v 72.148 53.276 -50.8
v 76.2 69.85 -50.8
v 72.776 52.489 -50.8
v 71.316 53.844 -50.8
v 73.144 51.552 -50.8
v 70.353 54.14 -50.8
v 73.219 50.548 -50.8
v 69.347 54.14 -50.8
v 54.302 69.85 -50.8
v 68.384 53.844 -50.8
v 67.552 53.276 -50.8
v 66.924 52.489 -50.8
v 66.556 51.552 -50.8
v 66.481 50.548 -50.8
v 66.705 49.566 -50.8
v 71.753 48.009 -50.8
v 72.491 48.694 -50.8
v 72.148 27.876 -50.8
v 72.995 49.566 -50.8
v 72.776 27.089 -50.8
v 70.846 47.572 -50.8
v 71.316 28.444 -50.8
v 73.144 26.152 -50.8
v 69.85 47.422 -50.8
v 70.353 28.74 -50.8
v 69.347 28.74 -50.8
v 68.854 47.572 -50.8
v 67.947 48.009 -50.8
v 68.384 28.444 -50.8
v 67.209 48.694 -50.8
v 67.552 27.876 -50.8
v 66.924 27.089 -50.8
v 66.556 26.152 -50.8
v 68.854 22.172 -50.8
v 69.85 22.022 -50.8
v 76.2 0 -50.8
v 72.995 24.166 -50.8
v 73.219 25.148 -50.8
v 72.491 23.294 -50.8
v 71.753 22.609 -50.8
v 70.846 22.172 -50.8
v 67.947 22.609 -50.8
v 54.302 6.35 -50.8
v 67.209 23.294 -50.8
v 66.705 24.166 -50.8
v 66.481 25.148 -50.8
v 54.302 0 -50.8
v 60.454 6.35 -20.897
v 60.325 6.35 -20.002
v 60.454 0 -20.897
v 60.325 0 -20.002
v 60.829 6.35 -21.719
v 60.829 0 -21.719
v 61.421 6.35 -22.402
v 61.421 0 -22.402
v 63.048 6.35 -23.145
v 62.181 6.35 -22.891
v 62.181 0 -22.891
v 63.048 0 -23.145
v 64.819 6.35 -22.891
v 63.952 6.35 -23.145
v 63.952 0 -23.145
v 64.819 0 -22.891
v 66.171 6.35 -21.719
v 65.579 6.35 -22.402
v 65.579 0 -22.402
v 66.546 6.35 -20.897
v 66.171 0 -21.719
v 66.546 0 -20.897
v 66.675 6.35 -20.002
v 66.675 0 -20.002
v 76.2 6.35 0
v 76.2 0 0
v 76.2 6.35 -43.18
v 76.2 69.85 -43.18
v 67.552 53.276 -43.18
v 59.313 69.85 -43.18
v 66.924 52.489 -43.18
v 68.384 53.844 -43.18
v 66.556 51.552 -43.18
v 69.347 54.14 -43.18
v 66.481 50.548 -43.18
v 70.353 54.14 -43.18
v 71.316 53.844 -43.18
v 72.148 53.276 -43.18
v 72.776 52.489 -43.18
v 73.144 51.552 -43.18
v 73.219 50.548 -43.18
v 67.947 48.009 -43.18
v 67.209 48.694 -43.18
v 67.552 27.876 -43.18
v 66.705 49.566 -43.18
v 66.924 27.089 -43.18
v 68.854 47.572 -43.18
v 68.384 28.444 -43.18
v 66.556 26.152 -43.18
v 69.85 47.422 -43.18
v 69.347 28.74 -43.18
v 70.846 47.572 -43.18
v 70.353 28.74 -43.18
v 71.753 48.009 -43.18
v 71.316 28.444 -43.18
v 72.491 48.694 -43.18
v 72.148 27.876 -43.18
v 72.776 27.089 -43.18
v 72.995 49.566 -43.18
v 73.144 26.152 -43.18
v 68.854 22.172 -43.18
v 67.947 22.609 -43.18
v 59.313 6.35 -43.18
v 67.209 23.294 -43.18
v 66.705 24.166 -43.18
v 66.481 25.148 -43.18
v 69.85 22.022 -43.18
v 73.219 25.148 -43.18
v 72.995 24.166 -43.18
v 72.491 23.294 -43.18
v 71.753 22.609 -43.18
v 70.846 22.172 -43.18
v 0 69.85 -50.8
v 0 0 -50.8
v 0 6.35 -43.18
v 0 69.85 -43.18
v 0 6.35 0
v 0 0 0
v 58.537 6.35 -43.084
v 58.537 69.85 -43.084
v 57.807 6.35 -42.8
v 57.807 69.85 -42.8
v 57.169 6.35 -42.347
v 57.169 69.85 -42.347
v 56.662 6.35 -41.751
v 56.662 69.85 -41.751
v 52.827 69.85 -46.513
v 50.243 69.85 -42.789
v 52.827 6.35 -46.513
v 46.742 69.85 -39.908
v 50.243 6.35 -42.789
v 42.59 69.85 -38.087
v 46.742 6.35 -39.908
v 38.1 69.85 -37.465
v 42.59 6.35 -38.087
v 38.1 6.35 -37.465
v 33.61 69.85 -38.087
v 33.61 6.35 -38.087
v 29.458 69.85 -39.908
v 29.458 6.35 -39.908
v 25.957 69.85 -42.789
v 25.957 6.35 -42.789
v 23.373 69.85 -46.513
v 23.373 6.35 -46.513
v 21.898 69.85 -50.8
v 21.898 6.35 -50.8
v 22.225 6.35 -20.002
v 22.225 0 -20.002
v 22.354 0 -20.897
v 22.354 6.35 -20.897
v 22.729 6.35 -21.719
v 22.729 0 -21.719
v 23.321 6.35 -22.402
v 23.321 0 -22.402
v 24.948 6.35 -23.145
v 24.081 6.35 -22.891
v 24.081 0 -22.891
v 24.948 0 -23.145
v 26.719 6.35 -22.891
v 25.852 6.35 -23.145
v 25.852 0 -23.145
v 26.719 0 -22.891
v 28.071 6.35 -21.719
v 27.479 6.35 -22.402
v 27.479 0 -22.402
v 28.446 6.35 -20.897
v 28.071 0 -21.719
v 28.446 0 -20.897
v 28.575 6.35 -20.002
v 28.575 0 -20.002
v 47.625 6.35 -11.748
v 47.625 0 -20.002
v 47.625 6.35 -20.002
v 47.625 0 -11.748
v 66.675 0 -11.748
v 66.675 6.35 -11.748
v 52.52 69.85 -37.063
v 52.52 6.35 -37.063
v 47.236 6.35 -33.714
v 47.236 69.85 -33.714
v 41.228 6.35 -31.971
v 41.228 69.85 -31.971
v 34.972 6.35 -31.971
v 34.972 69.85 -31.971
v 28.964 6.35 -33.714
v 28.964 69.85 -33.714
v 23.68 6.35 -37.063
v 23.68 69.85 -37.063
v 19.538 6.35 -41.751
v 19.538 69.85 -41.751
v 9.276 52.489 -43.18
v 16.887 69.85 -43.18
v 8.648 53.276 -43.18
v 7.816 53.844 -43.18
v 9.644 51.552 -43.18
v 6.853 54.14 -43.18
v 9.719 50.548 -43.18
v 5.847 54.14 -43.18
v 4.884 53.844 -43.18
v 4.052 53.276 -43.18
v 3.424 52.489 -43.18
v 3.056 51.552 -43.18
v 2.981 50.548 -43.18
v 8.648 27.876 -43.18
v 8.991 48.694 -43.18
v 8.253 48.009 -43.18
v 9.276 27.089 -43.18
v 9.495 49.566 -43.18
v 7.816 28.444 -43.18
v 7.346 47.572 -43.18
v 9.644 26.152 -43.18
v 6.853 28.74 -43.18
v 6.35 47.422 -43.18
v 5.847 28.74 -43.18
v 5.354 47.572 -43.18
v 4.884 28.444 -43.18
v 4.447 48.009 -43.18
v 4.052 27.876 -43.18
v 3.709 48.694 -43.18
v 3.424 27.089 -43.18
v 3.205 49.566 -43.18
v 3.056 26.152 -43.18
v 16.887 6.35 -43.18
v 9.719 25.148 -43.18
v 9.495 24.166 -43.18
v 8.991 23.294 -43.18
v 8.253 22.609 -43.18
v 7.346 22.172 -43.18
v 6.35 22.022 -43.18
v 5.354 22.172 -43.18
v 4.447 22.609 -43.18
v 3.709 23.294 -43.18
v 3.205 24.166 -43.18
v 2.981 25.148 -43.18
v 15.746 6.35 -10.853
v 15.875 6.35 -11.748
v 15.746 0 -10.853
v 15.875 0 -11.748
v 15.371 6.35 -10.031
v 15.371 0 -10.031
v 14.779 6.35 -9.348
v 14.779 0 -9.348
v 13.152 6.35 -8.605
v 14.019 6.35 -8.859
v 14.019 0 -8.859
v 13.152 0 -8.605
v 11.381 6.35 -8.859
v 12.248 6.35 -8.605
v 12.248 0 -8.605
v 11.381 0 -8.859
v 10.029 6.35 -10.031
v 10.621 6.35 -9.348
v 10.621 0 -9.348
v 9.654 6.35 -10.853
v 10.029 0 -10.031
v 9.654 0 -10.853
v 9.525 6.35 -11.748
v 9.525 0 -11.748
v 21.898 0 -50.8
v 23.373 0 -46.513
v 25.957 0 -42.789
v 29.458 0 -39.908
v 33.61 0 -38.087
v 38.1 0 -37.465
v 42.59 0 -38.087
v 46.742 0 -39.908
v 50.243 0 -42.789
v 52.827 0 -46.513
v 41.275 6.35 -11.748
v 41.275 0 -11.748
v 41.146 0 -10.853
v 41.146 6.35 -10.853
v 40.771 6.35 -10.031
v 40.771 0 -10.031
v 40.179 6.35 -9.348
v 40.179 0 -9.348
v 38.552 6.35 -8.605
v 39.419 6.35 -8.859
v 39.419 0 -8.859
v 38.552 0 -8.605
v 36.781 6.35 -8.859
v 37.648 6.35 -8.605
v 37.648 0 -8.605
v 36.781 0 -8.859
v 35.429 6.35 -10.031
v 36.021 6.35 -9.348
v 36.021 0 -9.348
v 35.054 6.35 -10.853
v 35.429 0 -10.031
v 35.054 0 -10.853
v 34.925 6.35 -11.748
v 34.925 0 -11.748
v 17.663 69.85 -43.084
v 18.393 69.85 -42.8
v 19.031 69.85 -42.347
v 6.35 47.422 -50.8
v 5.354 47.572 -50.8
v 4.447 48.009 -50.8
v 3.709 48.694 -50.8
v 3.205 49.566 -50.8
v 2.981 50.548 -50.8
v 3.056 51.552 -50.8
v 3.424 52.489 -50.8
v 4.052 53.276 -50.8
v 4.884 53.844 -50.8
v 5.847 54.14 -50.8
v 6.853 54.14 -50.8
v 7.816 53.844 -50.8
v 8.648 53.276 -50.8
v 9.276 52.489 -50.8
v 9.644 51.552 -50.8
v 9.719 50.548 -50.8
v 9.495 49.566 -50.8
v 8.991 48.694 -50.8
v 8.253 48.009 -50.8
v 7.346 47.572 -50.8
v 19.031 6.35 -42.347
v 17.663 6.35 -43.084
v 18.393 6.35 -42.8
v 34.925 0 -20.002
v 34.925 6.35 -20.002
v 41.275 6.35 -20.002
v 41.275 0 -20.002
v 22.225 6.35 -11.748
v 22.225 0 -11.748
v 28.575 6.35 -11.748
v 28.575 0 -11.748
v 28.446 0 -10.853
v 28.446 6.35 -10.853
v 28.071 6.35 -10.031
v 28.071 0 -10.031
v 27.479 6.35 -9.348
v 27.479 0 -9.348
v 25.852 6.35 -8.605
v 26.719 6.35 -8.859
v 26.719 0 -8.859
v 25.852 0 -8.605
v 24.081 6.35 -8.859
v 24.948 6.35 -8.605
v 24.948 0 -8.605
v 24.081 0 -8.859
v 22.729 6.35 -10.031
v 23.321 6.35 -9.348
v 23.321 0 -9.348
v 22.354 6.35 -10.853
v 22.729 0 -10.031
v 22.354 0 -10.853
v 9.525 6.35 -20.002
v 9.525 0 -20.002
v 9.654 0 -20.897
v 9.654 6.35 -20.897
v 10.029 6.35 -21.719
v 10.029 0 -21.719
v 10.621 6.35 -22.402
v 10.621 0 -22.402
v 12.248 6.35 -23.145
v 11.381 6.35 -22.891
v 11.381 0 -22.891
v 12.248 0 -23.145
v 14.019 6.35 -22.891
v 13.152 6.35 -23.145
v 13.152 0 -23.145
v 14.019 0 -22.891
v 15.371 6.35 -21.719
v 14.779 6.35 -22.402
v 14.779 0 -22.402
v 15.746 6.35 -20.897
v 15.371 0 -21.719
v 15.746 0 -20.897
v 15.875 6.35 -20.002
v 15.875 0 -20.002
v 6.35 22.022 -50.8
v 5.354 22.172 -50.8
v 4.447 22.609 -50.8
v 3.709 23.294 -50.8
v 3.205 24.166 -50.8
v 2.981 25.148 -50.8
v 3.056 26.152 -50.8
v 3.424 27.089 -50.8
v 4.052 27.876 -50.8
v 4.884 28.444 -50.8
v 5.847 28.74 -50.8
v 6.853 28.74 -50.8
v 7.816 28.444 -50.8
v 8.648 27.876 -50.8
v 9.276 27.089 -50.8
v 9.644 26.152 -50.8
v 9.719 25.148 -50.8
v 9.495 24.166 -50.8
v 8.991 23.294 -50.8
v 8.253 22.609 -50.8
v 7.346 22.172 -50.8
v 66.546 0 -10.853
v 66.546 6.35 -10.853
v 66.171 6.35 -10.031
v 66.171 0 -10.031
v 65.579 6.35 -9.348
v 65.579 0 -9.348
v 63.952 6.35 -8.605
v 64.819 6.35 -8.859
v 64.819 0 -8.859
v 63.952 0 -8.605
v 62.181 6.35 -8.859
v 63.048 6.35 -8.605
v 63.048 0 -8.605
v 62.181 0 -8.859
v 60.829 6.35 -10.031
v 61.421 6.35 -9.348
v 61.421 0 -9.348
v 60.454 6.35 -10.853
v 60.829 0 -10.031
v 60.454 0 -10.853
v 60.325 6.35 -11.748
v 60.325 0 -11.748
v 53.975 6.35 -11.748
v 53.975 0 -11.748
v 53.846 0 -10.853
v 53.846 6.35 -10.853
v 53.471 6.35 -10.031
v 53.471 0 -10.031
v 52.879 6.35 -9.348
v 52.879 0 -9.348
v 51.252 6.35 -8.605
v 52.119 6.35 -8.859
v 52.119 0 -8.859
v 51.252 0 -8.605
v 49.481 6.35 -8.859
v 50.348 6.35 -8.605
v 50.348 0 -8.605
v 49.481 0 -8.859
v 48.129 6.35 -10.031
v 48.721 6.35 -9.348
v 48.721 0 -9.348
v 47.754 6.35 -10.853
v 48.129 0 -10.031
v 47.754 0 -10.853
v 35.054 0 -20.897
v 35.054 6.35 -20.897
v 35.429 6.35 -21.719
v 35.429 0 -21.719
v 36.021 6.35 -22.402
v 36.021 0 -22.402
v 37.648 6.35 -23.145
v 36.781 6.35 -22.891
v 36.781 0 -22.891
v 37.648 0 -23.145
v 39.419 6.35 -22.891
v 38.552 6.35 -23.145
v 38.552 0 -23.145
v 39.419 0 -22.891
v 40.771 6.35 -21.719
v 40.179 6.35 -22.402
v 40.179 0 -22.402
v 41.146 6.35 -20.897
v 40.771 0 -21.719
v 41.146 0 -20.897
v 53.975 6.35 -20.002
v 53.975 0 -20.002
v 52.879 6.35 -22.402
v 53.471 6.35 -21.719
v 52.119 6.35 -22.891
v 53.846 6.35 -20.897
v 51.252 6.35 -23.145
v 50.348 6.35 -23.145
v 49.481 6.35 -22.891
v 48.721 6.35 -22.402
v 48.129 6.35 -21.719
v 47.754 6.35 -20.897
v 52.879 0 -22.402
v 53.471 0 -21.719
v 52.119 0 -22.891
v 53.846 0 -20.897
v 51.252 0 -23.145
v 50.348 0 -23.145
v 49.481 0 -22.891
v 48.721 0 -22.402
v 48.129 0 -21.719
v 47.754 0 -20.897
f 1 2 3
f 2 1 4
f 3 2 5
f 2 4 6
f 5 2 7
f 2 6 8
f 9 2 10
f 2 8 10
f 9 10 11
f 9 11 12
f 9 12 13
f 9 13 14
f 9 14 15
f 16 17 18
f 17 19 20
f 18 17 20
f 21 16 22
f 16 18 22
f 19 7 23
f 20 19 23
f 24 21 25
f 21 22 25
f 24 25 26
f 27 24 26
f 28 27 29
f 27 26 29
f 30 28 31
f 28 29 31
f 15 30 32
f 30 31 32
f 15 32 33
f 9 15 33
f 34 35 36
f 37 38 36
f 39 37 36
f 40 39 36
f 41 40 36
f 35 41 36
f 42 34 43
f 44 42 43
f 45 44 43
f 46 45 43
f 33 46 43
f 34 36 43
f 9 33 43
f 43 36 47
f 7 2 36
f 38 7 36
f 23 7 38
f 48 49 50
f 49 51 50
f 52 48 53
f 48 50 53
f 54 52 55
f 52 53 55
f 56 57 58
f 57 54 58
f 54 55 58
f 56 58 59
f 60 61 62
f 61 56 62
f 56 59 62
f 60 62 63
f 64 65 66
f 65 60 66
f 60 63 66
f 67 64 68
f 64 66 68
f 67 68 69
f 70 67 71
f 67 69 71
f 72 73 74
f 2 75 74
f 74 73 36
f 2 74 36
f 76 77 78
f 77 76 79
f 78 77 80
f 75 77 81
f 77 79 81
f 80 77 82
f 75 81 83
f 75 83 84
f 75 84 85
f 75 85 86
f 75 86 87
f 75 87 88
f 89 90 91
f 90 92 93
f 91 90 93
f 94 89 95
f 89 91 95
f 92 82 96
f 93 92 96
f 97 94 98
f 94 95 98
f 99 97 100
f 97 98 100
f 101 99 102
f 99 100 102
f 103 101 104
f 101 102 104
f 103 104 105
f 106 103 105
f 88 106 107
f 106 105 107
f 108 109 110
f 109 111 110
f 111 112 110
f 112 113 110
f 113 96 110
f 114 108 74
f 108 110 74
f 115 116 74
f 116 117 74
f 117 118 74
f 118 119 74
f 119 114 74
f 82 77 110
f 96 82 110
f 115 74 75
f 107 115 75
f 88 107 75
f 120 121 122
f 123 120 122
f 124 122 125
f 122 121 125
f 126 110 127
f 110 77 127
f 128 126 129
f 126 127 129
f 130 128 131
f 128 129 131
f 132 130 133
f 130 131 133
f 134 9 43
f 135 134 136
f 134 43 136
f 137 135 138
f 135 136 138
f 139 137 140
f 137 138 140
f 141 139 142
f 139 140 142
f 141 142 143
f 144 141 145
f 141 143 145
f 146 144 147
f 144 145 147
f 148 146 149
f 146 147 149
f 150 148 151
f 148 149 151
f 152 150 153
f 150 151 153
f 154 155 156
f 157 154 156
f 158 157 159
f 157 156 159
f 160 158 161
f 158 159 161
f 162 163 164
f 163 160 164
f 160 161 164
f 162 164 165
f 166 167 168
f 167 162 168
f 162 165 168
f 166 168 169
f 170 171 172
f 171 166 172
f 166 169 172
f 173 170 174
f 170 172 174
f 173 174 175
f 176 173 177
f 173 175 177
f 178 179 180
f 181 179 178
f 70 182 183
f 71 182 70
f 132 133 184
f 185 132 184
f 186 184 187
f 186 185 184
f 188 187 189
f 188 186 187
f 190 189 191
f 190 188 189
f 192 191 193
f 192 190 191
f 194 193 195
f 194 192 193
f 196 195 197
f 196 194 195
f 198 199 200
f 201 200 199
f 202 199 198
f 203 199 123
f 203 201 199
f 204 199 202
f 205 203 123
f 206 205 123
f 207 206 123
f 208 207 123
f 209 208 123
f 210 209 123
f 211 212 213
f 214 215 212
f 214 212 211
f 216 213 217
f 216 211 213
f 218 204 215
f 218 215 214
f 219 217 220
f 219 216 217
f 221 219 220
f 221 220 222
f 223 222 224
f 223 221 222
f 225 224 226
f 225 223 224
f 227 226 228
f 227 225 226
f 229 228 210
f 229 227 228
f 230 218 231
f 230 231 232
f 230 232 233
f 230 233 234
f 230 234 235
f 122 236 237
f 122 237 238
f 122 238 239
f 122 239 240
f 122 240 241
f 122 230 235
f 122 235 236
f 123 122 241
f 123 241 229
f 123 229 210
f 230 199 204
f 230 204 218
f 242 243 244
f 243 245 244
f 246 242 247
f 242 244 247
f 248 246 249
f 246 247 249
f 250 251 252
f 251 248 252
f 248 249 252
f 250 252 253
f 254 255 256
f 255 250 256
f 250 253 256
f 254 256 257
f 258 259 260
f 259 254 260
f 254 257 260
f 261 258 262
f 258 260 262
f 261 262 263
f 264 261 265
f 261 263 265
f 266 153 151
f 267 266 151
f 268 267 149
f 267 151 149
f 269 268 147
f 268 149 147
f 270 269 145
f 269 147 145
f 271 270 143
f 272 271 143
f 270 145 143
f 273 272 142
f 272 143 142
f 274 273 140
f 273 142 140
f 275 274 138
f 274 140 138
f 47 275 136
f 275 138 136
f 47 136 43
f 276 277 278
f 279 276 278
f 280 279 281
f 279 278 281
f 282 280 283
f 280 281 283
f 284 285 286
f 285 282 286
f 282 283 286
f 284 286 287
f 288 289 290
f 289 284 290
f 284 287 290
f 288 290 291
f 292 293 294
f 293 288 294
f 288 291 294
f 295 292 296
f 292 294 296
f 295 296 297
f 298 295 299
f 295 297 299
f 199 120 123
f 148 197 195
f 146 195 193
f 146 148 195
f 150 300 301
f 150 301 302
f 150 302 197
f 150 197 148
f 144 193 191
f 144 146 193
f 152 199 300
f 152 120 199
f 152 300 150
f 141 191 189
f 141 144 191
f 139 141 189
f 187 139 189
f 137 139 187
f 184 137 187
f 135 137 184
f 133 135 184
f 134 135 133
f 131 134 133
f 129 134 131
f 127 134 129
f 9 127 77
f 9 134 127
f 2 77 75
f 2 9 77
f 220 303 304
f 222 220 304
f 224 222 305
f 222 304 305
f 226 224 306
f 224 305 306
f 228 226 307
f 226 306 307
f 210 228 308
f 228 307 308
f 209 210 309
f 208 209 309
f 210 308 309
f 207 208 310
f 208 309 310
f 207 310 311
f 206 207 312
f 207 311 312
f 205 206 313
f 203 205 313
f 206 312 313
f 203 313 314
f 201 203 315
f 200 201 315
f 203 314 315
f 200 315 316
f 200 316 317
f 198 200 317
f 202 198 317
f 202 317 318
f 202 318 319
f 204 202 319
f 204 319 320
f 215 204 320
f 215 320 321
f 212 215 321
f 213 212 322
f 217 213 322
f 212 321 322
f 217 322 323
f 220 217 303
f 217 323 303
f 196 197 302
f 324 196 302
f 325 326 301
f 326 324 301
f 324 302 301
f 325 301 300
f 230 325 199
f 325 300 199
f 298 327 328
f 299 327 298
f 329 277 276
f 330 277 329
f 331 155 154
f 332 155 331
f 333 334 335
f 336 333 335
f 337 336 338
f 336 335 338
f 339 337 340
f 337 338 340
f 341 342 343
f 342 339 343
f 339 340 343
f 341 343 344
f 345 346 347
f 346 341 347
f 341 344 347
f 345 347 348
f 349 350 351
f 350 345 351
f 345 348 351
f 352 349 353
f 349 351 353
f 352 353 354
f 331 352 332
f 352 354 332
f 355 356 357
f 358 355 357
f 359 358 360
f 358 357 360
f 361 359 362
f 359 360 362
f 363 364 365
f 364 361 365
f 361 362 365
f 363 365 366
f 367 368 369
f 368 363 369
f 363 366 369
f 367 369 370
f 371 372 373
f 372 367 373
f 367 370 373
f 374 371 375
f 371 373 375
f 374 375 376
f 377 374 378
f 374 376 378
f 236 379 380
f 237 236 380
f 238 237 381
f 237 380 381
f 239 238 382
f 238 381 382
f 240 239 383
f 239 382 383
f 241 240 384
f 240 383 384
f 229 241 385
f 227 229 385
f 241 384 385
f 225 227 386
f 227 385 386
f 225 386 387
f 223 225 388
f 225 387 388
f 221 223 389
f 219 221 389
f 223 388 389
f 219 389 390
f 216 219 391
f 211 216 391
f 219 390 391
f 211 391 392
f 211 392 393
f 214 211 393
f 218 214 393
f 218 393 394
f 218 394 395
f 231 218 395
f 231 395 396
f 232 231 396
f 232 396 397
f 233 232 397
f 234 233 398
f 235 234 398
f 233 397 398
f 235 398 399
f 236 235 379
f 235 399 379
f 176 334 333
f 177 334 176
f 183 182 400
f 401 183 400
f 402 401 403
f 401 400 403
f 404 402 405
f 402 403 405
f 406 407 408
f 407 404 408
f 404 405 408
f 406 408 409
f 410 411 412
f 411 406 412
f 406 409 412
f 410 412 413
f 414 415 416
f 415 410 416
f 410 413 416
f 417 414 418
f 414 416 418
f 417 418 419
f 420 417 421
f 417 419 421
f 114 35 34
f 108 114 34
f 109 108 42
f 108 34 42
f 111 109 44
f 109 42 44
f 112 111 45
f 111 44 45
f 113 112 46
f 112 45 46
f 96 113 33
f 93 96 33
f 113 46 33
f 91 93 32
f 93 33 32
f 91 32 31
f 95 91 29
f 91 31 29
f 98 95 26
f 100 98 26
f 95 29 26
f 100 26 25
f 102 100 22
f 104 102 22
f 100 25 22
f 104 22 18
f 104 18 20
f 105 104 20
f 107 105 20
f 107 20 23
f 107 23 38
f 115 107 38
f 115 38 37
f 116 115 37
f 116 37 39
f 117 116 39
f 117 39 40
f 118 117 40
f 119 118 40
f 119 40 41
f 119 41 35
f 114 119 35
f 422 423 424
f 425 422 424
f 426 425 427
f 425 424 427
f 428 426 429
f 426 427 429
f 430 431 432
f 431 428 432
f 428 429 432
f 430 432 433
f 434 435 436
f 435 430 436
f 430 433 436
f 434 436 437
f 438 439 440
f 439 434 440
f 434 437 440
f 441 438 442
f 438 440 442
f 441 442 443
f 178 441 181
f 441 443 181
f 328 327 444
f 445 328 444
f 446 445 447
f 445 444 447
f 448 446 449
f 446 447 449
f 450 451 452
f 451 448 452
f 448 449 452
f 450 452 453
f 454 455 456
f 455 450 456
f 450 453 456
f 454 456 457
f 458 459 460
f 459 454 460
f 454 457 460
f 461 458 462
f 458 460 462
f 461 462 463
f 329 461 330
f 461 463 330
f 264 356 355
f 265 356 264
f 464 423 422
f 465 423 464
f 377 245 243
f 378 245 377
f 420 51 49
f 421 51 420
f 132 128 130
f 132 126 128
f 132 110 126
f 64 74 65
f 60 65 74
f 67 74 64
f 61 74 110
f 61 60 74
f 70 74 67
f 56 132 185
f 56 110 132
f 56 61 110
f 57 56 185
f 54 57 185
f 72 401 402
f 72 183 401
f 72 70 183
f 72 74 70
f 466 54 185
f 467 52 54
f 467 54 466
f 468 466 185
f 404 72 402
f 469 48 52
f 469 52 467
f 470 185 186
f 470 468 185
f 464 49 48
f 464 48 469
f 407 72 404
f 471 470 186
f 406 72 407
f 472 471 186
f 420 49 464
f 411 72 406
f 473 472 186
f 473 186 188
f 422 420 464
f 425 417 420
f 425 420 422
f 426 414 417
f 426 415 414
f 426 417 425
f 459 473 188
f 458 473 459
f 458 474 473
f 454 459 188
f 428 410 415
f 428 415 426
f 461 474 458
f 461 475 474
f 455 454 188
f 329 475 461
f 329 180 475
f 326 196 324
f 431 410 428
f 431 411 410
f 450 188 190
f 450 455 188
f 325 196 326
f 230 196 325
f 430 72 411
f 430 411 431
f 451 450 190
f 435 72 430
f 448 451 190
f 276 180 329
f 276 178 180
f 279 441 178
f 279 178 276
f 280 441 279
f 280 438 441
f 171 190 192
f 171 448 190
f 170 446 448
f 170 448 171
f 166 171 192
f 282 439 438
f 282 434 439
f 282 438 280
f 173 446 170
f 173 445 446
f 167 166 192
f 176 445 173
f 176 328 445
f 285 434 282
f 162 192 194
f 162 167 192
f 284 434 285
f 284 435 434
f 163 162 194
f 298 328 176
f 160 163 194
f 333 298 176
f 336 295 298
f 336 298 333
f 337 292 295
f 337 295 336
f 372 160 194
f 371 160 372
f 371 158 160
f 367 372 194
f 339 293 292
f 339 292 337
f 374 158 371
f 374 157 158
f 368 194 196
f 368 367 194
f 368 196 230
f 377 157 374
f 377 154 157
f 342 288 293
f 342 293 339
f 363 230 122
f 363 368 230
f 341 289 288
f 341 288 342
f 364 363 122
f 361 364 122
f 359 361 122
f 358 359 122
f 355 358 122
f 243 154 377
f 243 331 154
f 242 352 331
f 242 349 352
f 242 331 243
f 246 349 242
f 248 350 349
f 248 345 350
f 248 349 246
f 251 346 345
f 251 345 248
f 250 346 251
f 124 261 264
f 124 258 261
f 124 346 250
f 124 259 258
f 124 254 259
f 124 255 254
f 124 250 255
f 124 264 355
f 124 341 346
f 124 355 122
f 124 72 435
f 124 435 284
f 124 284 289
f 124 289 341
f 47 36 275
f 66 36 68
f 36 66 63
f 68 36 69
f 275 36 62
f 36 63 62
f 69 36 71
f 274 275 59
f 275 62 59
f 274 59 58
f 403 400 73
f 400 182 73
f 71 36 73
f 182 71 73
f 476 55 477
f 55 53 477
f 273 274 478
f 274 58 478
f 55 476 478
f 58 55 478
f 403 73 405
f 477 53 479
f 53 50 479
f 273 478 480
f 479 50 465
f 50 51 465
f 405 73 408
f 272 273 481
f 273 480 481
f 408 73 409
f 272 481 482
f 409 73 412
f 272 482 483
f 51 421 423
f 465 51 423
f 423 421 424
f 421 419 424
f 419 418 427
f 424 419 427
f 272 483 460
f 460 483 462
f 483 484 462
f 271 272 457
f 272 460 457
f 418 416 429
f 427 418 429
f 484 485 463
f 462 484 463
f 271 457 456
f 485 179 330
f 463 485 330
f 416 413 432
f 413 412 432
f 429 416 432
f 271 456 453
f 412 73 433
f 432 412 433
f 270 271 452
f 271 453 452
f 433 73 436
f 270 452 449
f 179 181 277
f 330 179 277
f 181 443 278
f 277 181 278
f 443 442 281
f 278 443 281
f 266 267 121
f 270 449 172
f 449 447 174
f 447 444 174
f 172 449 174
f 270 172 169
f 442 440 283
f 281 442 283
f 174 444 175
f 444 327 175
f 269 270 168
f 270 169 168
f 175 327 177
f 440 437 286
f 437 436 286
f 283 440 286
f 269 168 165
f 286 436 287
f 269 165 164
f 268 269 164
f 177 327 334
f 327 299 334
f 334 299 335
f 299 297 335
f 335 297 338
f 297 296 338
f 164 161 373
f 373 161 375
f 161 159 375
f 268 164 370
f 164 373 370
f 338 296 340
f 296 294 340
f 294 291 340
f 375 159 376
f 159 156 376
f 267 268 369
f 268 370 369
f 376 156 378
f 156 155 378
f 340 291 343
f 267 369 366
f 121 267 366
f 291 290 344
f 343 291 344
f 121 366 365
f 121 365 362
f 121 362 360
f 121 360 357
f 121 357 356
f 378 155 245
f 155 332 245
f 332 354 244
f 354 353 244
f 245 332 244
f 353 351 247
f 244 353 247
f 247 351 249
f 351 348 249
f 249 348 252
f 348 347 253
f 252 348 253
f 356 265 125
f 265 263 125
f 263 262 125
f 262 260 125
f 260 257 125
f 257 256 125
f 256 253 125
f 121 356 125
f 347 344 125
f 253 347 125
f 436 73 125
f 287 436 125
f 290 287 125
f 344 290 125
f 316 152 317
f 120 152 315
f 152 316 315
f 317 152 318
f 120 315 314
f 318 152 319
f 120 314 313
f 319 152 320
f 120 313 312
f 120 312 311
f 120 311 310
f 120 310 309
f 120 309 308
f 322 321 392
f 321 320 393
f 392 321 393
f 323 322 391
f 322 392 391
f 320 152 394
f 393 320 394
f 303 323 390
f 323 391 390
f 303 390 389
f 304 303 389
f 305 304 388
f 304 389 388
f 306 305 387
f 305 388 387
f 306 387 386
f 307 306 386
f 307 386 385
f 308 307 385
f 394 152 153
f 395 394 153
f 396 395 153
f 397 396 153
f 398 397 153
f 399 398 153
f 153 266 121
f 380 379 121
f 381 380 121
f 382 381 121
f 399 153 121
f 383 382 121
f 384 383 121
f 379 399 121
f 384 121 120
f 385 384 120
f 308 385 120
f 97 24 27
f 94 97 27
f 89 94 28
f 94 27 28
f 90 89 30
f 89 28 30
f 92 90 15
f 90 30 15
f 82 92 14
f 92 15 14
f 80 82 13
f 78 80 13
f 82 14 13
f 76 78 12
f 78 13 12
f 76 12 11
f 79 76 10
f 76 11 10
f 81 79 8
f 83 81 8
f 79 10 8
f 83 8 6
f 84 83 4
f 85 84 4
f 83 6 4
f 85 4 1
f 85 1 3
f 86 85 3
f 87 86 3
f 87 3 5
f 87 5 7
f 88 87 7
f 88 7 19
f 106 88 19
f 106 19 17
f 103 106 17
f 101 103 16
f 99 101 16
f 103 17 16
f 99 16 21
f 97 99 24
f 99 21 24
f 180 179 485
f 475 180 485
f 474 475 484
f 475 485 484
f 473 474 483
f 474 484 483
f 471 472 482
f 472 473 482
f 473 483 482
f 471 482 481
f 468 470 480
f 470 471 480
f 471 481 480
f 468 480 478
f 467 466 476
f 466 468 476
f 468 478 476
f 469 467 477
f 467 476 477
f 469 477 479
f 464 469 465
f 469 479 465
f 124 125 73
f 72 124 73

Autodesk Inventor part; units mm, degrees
ref_plane "YZ Plane" through (0, 0, 0) normal (1, 0, 0) x (0, 1, 0)
ref_plane "XZ Plane" through (0, 0, 0) normal (0, 1, 0) x (-1, 0, 0)
ref_plane "XY Plane" through (0, 0, 0) normal (0, 0, 1) x (1, 0, 0)
sketch "Sketch1" plane through (0, 0, 0) normal (0, 1, 0) x (-1, 0, 0)
  line L0 (0, 0) -> (-76.2, 0)
  line L1 (-76.2, 0) -> (-76.2, -50.8)
  line L2 (-76.2, -50.8) -> (0, -50.8)
  line L3 (0, -50.8) -> (0, 0)
  line L4 (-12.7, -11.7475) -> (-12.7, -20.0025) construction
  line L5 (-15.875, -11.7475) -> (-15.875, -20.0025)
  line L6 (-9.525, -20.0025) -> (-9.525, -11.7475)
  arc A0 (-9.525, -11.7475) -> (-15.875, -11.7475) centre (-12.7, -11.7475) ccw
  arc A1 (-15.875, -20.0025) -> (-9.525, -20.0025) centre (-12.7, -20.0025) ccw
  line L7 (-25.4, -11.7475) -> (-25.4, -20.0025) construction
  line L8 (-28.575, -11.7475) -> (-28.575, -20.0025)
  line L9 (-22.225, -20.0025) -> (-22.225, -11.7475)
  arc A2 (-22.225, -11.7475) -> (-28.575, -11.7475) centre (-25.4, -11.7475) ccw
  arc A3 (-28.575, -20.0025) -> (-22.225, -20.0025) centre (-25.4, -20.0025) ccw
  line L10 (-28.575, -11.7475) -> (-28.575, -20.0025)
  line L11 (-25.4, -11.7475) -> (-25.4, -20.0025) construction
  arc A4 (-22.225, -11.7475) -> (-28.575, -11.7475) centre (-25.4, -11.7475) ccw
  line L12 (-22.225, -20.0025) -> (-22.225, -11.7475)
  arc A5 (-28.575, -20.0025) -> (-22.225, -20.0025) centre (-25.4, -20.0025) ccw
  line L13 (-41.275, -11.7475) -> (-41.275, -20.0025)
  line L14 (-38.1, -11.7475) -> (-38.1, -20.0025) construction
  arc A6 (-34.925, -11.7475) -> (-41.275, -11.7475) centre (-38.1, -11.7475) ccw
  line L15 (-34.925, -20.0025) -> (-34.925, -11.7475)
  arc A7 (-41.275, -20.0025) -> (-34.925, -20.0025) centre (-38.1, -20.0025) ccw
  line L16 (-53.975, -11.7475) -> (-53.975, -20.0025)
  line L17 (-50.8, -11.7475) -> (-50.8, -20.0025) construction
  arc A8 (-47.625, -11.7475) -> (-53.975, -11.7475) centre (-50.8, -11.7475) ccw
  line L18 (-47.625, -20.0025) -> (-47.625, -11.7475)
  arc A9 (-53.975, -20.0025) -> (-47.625, -20.0025) centre (-50.8, -20.0025) ccw
  line L19 (-66.675, -11.7475) -> (-66.675, -20.0025)
  line L20 (-63.5, -11.7475) -> (-63.5, -20.0025) construction
  arc A10 (-60.325, -11.7475) -> (-66.675, -11.7475) centre (-63.5, -11.7475) ccw
  line L21 (-60.325, -20.0025) -> (-60.325, -11.7475)
  arc A11 (-66.675, -20.0025) -> (-60.325, -20.0025) centre (-63.5, -20.0025) ccw
  point P0 (-12.7, -15.875)
  point P1 (-25.4, -15.875)
  point P2 (-25.4, -15.875)
  point P3 (-38.1, -15.875)
  point P4 (-50.8, -15.875)
  point P5 (-63.5, -15.875)
  dimension "d0" = 50.8
  dimension "d1" = 76.2
  dimension "d41" = 8.255
  dimension "d42" = 6.35
  dimension "d43" = 12.7
  dimension "d44" = 8.255
  dimension "d45" = 6.35
  dimension "d56" = 12.7
  dimension "d57" = 15.875
  dimension "d60" = 12.7
extrude "Extrusion1" add sketch "Sketch1" along normal blind 6.35
sketch "Sketch2" plane through (0, 6.35, 0) normal (0, 1, 0) x (1, 0, 0)
  line L0 (76.2, 50.8) -> (0, 50.8)
  circle A0 centre (38.1, 53.975) radius 16.51
  line L1 (0, 50.8) -> (0, 0) projected
  circle A1 centre (38.1, 53.975) radius 22.225
  line L2 (18.6727, 43.18) -> (0, 43.18)
  line L3 (76.2, 50.8) -> (0, 50.8) projected
  line L4 (57.5273, 43.18) -> (76.2, 43.18)
  line L5 (76.2, 0) -> (76.2, 50.8) projected
  point P0 (54.3018, 50.8)
  point P1 (21.8982, 50.8)
  dimension "d22" = 33.02
  dimension "d23" = 3.175
  dimension "d24" = 38.1
  dimension "d25" = 44.45
  dimension "d26" = 7.62
  dimension "d27" = 7.62
extrude "Extrusion2" add sketch "Sketch2" along normal blind 63.5 contours L5 L4 A1 L0 | A1 L0 A0 | L2 L1 L0 A1 picked at (21.7987, 42.02)
sketch "Sketch3" plane through (0, 6.35, -43.18) normal (0, 0, 1) x (1, 0, 0)
  line L0 (76.2, 0) -> (76.2, 63.5) projected
  line L1 (0, 0) -> (0, 63.5) projected
  line L2 (0, 63.5) -> (18.6727, 63.5) projected
  line L3 (57.5273, 63.5) -> (76.2, 63.5) projected
  line L4 (54.3018, 0) -> (21.8982, 0) projected
  point P0 (0, -6.35)
  point P1 (6.35, 44.45)
  point P2 (69.85, 44.45)
  point P3 (6.35, 19.05)
  point P4 (69.85, 19.05)
  dimension "d30" = 6.35
  dimension "d31" = 6.35
  dimension "d32" = 19.05
  dimension "d33" = 19.05
  dimension "d52" = 6.35
  dimension "d53" = 6.35
  dimension "d54" = 19.05
  dimension "d55" = 19.05
hole "Hole1" at (6.35, 50.8, -43.18) at (6.35, 25.4, -43.18) at (69.85, 25.4, -43.18) at (69.85, 50.8, -43.18) direction (0, 0, -1) diameter 6.7564 end through all
fillet "Fillet1" radius 3.175 2 edges at (18.6727, 38.1, -43.18) (57.5273, 38.1, -43.18)
sketch "Sketch6" plane through (0, 6.35, 0) normal (0, 1, 0) x (1, 0, 0)
  circle A0 centre (38.1, 53.975) radius 16.51
  arc A1 (21.8982, 50.8) -> (54.3018, 50.8) centre (38.1, 53.975) ccw projected
  point P0 (0, 0)
  dimension "d49" = 33.02
extrude "Extrusion3" cut sketch "Sketch6" against normal blind 25.4
properties part number "CLAMP"
